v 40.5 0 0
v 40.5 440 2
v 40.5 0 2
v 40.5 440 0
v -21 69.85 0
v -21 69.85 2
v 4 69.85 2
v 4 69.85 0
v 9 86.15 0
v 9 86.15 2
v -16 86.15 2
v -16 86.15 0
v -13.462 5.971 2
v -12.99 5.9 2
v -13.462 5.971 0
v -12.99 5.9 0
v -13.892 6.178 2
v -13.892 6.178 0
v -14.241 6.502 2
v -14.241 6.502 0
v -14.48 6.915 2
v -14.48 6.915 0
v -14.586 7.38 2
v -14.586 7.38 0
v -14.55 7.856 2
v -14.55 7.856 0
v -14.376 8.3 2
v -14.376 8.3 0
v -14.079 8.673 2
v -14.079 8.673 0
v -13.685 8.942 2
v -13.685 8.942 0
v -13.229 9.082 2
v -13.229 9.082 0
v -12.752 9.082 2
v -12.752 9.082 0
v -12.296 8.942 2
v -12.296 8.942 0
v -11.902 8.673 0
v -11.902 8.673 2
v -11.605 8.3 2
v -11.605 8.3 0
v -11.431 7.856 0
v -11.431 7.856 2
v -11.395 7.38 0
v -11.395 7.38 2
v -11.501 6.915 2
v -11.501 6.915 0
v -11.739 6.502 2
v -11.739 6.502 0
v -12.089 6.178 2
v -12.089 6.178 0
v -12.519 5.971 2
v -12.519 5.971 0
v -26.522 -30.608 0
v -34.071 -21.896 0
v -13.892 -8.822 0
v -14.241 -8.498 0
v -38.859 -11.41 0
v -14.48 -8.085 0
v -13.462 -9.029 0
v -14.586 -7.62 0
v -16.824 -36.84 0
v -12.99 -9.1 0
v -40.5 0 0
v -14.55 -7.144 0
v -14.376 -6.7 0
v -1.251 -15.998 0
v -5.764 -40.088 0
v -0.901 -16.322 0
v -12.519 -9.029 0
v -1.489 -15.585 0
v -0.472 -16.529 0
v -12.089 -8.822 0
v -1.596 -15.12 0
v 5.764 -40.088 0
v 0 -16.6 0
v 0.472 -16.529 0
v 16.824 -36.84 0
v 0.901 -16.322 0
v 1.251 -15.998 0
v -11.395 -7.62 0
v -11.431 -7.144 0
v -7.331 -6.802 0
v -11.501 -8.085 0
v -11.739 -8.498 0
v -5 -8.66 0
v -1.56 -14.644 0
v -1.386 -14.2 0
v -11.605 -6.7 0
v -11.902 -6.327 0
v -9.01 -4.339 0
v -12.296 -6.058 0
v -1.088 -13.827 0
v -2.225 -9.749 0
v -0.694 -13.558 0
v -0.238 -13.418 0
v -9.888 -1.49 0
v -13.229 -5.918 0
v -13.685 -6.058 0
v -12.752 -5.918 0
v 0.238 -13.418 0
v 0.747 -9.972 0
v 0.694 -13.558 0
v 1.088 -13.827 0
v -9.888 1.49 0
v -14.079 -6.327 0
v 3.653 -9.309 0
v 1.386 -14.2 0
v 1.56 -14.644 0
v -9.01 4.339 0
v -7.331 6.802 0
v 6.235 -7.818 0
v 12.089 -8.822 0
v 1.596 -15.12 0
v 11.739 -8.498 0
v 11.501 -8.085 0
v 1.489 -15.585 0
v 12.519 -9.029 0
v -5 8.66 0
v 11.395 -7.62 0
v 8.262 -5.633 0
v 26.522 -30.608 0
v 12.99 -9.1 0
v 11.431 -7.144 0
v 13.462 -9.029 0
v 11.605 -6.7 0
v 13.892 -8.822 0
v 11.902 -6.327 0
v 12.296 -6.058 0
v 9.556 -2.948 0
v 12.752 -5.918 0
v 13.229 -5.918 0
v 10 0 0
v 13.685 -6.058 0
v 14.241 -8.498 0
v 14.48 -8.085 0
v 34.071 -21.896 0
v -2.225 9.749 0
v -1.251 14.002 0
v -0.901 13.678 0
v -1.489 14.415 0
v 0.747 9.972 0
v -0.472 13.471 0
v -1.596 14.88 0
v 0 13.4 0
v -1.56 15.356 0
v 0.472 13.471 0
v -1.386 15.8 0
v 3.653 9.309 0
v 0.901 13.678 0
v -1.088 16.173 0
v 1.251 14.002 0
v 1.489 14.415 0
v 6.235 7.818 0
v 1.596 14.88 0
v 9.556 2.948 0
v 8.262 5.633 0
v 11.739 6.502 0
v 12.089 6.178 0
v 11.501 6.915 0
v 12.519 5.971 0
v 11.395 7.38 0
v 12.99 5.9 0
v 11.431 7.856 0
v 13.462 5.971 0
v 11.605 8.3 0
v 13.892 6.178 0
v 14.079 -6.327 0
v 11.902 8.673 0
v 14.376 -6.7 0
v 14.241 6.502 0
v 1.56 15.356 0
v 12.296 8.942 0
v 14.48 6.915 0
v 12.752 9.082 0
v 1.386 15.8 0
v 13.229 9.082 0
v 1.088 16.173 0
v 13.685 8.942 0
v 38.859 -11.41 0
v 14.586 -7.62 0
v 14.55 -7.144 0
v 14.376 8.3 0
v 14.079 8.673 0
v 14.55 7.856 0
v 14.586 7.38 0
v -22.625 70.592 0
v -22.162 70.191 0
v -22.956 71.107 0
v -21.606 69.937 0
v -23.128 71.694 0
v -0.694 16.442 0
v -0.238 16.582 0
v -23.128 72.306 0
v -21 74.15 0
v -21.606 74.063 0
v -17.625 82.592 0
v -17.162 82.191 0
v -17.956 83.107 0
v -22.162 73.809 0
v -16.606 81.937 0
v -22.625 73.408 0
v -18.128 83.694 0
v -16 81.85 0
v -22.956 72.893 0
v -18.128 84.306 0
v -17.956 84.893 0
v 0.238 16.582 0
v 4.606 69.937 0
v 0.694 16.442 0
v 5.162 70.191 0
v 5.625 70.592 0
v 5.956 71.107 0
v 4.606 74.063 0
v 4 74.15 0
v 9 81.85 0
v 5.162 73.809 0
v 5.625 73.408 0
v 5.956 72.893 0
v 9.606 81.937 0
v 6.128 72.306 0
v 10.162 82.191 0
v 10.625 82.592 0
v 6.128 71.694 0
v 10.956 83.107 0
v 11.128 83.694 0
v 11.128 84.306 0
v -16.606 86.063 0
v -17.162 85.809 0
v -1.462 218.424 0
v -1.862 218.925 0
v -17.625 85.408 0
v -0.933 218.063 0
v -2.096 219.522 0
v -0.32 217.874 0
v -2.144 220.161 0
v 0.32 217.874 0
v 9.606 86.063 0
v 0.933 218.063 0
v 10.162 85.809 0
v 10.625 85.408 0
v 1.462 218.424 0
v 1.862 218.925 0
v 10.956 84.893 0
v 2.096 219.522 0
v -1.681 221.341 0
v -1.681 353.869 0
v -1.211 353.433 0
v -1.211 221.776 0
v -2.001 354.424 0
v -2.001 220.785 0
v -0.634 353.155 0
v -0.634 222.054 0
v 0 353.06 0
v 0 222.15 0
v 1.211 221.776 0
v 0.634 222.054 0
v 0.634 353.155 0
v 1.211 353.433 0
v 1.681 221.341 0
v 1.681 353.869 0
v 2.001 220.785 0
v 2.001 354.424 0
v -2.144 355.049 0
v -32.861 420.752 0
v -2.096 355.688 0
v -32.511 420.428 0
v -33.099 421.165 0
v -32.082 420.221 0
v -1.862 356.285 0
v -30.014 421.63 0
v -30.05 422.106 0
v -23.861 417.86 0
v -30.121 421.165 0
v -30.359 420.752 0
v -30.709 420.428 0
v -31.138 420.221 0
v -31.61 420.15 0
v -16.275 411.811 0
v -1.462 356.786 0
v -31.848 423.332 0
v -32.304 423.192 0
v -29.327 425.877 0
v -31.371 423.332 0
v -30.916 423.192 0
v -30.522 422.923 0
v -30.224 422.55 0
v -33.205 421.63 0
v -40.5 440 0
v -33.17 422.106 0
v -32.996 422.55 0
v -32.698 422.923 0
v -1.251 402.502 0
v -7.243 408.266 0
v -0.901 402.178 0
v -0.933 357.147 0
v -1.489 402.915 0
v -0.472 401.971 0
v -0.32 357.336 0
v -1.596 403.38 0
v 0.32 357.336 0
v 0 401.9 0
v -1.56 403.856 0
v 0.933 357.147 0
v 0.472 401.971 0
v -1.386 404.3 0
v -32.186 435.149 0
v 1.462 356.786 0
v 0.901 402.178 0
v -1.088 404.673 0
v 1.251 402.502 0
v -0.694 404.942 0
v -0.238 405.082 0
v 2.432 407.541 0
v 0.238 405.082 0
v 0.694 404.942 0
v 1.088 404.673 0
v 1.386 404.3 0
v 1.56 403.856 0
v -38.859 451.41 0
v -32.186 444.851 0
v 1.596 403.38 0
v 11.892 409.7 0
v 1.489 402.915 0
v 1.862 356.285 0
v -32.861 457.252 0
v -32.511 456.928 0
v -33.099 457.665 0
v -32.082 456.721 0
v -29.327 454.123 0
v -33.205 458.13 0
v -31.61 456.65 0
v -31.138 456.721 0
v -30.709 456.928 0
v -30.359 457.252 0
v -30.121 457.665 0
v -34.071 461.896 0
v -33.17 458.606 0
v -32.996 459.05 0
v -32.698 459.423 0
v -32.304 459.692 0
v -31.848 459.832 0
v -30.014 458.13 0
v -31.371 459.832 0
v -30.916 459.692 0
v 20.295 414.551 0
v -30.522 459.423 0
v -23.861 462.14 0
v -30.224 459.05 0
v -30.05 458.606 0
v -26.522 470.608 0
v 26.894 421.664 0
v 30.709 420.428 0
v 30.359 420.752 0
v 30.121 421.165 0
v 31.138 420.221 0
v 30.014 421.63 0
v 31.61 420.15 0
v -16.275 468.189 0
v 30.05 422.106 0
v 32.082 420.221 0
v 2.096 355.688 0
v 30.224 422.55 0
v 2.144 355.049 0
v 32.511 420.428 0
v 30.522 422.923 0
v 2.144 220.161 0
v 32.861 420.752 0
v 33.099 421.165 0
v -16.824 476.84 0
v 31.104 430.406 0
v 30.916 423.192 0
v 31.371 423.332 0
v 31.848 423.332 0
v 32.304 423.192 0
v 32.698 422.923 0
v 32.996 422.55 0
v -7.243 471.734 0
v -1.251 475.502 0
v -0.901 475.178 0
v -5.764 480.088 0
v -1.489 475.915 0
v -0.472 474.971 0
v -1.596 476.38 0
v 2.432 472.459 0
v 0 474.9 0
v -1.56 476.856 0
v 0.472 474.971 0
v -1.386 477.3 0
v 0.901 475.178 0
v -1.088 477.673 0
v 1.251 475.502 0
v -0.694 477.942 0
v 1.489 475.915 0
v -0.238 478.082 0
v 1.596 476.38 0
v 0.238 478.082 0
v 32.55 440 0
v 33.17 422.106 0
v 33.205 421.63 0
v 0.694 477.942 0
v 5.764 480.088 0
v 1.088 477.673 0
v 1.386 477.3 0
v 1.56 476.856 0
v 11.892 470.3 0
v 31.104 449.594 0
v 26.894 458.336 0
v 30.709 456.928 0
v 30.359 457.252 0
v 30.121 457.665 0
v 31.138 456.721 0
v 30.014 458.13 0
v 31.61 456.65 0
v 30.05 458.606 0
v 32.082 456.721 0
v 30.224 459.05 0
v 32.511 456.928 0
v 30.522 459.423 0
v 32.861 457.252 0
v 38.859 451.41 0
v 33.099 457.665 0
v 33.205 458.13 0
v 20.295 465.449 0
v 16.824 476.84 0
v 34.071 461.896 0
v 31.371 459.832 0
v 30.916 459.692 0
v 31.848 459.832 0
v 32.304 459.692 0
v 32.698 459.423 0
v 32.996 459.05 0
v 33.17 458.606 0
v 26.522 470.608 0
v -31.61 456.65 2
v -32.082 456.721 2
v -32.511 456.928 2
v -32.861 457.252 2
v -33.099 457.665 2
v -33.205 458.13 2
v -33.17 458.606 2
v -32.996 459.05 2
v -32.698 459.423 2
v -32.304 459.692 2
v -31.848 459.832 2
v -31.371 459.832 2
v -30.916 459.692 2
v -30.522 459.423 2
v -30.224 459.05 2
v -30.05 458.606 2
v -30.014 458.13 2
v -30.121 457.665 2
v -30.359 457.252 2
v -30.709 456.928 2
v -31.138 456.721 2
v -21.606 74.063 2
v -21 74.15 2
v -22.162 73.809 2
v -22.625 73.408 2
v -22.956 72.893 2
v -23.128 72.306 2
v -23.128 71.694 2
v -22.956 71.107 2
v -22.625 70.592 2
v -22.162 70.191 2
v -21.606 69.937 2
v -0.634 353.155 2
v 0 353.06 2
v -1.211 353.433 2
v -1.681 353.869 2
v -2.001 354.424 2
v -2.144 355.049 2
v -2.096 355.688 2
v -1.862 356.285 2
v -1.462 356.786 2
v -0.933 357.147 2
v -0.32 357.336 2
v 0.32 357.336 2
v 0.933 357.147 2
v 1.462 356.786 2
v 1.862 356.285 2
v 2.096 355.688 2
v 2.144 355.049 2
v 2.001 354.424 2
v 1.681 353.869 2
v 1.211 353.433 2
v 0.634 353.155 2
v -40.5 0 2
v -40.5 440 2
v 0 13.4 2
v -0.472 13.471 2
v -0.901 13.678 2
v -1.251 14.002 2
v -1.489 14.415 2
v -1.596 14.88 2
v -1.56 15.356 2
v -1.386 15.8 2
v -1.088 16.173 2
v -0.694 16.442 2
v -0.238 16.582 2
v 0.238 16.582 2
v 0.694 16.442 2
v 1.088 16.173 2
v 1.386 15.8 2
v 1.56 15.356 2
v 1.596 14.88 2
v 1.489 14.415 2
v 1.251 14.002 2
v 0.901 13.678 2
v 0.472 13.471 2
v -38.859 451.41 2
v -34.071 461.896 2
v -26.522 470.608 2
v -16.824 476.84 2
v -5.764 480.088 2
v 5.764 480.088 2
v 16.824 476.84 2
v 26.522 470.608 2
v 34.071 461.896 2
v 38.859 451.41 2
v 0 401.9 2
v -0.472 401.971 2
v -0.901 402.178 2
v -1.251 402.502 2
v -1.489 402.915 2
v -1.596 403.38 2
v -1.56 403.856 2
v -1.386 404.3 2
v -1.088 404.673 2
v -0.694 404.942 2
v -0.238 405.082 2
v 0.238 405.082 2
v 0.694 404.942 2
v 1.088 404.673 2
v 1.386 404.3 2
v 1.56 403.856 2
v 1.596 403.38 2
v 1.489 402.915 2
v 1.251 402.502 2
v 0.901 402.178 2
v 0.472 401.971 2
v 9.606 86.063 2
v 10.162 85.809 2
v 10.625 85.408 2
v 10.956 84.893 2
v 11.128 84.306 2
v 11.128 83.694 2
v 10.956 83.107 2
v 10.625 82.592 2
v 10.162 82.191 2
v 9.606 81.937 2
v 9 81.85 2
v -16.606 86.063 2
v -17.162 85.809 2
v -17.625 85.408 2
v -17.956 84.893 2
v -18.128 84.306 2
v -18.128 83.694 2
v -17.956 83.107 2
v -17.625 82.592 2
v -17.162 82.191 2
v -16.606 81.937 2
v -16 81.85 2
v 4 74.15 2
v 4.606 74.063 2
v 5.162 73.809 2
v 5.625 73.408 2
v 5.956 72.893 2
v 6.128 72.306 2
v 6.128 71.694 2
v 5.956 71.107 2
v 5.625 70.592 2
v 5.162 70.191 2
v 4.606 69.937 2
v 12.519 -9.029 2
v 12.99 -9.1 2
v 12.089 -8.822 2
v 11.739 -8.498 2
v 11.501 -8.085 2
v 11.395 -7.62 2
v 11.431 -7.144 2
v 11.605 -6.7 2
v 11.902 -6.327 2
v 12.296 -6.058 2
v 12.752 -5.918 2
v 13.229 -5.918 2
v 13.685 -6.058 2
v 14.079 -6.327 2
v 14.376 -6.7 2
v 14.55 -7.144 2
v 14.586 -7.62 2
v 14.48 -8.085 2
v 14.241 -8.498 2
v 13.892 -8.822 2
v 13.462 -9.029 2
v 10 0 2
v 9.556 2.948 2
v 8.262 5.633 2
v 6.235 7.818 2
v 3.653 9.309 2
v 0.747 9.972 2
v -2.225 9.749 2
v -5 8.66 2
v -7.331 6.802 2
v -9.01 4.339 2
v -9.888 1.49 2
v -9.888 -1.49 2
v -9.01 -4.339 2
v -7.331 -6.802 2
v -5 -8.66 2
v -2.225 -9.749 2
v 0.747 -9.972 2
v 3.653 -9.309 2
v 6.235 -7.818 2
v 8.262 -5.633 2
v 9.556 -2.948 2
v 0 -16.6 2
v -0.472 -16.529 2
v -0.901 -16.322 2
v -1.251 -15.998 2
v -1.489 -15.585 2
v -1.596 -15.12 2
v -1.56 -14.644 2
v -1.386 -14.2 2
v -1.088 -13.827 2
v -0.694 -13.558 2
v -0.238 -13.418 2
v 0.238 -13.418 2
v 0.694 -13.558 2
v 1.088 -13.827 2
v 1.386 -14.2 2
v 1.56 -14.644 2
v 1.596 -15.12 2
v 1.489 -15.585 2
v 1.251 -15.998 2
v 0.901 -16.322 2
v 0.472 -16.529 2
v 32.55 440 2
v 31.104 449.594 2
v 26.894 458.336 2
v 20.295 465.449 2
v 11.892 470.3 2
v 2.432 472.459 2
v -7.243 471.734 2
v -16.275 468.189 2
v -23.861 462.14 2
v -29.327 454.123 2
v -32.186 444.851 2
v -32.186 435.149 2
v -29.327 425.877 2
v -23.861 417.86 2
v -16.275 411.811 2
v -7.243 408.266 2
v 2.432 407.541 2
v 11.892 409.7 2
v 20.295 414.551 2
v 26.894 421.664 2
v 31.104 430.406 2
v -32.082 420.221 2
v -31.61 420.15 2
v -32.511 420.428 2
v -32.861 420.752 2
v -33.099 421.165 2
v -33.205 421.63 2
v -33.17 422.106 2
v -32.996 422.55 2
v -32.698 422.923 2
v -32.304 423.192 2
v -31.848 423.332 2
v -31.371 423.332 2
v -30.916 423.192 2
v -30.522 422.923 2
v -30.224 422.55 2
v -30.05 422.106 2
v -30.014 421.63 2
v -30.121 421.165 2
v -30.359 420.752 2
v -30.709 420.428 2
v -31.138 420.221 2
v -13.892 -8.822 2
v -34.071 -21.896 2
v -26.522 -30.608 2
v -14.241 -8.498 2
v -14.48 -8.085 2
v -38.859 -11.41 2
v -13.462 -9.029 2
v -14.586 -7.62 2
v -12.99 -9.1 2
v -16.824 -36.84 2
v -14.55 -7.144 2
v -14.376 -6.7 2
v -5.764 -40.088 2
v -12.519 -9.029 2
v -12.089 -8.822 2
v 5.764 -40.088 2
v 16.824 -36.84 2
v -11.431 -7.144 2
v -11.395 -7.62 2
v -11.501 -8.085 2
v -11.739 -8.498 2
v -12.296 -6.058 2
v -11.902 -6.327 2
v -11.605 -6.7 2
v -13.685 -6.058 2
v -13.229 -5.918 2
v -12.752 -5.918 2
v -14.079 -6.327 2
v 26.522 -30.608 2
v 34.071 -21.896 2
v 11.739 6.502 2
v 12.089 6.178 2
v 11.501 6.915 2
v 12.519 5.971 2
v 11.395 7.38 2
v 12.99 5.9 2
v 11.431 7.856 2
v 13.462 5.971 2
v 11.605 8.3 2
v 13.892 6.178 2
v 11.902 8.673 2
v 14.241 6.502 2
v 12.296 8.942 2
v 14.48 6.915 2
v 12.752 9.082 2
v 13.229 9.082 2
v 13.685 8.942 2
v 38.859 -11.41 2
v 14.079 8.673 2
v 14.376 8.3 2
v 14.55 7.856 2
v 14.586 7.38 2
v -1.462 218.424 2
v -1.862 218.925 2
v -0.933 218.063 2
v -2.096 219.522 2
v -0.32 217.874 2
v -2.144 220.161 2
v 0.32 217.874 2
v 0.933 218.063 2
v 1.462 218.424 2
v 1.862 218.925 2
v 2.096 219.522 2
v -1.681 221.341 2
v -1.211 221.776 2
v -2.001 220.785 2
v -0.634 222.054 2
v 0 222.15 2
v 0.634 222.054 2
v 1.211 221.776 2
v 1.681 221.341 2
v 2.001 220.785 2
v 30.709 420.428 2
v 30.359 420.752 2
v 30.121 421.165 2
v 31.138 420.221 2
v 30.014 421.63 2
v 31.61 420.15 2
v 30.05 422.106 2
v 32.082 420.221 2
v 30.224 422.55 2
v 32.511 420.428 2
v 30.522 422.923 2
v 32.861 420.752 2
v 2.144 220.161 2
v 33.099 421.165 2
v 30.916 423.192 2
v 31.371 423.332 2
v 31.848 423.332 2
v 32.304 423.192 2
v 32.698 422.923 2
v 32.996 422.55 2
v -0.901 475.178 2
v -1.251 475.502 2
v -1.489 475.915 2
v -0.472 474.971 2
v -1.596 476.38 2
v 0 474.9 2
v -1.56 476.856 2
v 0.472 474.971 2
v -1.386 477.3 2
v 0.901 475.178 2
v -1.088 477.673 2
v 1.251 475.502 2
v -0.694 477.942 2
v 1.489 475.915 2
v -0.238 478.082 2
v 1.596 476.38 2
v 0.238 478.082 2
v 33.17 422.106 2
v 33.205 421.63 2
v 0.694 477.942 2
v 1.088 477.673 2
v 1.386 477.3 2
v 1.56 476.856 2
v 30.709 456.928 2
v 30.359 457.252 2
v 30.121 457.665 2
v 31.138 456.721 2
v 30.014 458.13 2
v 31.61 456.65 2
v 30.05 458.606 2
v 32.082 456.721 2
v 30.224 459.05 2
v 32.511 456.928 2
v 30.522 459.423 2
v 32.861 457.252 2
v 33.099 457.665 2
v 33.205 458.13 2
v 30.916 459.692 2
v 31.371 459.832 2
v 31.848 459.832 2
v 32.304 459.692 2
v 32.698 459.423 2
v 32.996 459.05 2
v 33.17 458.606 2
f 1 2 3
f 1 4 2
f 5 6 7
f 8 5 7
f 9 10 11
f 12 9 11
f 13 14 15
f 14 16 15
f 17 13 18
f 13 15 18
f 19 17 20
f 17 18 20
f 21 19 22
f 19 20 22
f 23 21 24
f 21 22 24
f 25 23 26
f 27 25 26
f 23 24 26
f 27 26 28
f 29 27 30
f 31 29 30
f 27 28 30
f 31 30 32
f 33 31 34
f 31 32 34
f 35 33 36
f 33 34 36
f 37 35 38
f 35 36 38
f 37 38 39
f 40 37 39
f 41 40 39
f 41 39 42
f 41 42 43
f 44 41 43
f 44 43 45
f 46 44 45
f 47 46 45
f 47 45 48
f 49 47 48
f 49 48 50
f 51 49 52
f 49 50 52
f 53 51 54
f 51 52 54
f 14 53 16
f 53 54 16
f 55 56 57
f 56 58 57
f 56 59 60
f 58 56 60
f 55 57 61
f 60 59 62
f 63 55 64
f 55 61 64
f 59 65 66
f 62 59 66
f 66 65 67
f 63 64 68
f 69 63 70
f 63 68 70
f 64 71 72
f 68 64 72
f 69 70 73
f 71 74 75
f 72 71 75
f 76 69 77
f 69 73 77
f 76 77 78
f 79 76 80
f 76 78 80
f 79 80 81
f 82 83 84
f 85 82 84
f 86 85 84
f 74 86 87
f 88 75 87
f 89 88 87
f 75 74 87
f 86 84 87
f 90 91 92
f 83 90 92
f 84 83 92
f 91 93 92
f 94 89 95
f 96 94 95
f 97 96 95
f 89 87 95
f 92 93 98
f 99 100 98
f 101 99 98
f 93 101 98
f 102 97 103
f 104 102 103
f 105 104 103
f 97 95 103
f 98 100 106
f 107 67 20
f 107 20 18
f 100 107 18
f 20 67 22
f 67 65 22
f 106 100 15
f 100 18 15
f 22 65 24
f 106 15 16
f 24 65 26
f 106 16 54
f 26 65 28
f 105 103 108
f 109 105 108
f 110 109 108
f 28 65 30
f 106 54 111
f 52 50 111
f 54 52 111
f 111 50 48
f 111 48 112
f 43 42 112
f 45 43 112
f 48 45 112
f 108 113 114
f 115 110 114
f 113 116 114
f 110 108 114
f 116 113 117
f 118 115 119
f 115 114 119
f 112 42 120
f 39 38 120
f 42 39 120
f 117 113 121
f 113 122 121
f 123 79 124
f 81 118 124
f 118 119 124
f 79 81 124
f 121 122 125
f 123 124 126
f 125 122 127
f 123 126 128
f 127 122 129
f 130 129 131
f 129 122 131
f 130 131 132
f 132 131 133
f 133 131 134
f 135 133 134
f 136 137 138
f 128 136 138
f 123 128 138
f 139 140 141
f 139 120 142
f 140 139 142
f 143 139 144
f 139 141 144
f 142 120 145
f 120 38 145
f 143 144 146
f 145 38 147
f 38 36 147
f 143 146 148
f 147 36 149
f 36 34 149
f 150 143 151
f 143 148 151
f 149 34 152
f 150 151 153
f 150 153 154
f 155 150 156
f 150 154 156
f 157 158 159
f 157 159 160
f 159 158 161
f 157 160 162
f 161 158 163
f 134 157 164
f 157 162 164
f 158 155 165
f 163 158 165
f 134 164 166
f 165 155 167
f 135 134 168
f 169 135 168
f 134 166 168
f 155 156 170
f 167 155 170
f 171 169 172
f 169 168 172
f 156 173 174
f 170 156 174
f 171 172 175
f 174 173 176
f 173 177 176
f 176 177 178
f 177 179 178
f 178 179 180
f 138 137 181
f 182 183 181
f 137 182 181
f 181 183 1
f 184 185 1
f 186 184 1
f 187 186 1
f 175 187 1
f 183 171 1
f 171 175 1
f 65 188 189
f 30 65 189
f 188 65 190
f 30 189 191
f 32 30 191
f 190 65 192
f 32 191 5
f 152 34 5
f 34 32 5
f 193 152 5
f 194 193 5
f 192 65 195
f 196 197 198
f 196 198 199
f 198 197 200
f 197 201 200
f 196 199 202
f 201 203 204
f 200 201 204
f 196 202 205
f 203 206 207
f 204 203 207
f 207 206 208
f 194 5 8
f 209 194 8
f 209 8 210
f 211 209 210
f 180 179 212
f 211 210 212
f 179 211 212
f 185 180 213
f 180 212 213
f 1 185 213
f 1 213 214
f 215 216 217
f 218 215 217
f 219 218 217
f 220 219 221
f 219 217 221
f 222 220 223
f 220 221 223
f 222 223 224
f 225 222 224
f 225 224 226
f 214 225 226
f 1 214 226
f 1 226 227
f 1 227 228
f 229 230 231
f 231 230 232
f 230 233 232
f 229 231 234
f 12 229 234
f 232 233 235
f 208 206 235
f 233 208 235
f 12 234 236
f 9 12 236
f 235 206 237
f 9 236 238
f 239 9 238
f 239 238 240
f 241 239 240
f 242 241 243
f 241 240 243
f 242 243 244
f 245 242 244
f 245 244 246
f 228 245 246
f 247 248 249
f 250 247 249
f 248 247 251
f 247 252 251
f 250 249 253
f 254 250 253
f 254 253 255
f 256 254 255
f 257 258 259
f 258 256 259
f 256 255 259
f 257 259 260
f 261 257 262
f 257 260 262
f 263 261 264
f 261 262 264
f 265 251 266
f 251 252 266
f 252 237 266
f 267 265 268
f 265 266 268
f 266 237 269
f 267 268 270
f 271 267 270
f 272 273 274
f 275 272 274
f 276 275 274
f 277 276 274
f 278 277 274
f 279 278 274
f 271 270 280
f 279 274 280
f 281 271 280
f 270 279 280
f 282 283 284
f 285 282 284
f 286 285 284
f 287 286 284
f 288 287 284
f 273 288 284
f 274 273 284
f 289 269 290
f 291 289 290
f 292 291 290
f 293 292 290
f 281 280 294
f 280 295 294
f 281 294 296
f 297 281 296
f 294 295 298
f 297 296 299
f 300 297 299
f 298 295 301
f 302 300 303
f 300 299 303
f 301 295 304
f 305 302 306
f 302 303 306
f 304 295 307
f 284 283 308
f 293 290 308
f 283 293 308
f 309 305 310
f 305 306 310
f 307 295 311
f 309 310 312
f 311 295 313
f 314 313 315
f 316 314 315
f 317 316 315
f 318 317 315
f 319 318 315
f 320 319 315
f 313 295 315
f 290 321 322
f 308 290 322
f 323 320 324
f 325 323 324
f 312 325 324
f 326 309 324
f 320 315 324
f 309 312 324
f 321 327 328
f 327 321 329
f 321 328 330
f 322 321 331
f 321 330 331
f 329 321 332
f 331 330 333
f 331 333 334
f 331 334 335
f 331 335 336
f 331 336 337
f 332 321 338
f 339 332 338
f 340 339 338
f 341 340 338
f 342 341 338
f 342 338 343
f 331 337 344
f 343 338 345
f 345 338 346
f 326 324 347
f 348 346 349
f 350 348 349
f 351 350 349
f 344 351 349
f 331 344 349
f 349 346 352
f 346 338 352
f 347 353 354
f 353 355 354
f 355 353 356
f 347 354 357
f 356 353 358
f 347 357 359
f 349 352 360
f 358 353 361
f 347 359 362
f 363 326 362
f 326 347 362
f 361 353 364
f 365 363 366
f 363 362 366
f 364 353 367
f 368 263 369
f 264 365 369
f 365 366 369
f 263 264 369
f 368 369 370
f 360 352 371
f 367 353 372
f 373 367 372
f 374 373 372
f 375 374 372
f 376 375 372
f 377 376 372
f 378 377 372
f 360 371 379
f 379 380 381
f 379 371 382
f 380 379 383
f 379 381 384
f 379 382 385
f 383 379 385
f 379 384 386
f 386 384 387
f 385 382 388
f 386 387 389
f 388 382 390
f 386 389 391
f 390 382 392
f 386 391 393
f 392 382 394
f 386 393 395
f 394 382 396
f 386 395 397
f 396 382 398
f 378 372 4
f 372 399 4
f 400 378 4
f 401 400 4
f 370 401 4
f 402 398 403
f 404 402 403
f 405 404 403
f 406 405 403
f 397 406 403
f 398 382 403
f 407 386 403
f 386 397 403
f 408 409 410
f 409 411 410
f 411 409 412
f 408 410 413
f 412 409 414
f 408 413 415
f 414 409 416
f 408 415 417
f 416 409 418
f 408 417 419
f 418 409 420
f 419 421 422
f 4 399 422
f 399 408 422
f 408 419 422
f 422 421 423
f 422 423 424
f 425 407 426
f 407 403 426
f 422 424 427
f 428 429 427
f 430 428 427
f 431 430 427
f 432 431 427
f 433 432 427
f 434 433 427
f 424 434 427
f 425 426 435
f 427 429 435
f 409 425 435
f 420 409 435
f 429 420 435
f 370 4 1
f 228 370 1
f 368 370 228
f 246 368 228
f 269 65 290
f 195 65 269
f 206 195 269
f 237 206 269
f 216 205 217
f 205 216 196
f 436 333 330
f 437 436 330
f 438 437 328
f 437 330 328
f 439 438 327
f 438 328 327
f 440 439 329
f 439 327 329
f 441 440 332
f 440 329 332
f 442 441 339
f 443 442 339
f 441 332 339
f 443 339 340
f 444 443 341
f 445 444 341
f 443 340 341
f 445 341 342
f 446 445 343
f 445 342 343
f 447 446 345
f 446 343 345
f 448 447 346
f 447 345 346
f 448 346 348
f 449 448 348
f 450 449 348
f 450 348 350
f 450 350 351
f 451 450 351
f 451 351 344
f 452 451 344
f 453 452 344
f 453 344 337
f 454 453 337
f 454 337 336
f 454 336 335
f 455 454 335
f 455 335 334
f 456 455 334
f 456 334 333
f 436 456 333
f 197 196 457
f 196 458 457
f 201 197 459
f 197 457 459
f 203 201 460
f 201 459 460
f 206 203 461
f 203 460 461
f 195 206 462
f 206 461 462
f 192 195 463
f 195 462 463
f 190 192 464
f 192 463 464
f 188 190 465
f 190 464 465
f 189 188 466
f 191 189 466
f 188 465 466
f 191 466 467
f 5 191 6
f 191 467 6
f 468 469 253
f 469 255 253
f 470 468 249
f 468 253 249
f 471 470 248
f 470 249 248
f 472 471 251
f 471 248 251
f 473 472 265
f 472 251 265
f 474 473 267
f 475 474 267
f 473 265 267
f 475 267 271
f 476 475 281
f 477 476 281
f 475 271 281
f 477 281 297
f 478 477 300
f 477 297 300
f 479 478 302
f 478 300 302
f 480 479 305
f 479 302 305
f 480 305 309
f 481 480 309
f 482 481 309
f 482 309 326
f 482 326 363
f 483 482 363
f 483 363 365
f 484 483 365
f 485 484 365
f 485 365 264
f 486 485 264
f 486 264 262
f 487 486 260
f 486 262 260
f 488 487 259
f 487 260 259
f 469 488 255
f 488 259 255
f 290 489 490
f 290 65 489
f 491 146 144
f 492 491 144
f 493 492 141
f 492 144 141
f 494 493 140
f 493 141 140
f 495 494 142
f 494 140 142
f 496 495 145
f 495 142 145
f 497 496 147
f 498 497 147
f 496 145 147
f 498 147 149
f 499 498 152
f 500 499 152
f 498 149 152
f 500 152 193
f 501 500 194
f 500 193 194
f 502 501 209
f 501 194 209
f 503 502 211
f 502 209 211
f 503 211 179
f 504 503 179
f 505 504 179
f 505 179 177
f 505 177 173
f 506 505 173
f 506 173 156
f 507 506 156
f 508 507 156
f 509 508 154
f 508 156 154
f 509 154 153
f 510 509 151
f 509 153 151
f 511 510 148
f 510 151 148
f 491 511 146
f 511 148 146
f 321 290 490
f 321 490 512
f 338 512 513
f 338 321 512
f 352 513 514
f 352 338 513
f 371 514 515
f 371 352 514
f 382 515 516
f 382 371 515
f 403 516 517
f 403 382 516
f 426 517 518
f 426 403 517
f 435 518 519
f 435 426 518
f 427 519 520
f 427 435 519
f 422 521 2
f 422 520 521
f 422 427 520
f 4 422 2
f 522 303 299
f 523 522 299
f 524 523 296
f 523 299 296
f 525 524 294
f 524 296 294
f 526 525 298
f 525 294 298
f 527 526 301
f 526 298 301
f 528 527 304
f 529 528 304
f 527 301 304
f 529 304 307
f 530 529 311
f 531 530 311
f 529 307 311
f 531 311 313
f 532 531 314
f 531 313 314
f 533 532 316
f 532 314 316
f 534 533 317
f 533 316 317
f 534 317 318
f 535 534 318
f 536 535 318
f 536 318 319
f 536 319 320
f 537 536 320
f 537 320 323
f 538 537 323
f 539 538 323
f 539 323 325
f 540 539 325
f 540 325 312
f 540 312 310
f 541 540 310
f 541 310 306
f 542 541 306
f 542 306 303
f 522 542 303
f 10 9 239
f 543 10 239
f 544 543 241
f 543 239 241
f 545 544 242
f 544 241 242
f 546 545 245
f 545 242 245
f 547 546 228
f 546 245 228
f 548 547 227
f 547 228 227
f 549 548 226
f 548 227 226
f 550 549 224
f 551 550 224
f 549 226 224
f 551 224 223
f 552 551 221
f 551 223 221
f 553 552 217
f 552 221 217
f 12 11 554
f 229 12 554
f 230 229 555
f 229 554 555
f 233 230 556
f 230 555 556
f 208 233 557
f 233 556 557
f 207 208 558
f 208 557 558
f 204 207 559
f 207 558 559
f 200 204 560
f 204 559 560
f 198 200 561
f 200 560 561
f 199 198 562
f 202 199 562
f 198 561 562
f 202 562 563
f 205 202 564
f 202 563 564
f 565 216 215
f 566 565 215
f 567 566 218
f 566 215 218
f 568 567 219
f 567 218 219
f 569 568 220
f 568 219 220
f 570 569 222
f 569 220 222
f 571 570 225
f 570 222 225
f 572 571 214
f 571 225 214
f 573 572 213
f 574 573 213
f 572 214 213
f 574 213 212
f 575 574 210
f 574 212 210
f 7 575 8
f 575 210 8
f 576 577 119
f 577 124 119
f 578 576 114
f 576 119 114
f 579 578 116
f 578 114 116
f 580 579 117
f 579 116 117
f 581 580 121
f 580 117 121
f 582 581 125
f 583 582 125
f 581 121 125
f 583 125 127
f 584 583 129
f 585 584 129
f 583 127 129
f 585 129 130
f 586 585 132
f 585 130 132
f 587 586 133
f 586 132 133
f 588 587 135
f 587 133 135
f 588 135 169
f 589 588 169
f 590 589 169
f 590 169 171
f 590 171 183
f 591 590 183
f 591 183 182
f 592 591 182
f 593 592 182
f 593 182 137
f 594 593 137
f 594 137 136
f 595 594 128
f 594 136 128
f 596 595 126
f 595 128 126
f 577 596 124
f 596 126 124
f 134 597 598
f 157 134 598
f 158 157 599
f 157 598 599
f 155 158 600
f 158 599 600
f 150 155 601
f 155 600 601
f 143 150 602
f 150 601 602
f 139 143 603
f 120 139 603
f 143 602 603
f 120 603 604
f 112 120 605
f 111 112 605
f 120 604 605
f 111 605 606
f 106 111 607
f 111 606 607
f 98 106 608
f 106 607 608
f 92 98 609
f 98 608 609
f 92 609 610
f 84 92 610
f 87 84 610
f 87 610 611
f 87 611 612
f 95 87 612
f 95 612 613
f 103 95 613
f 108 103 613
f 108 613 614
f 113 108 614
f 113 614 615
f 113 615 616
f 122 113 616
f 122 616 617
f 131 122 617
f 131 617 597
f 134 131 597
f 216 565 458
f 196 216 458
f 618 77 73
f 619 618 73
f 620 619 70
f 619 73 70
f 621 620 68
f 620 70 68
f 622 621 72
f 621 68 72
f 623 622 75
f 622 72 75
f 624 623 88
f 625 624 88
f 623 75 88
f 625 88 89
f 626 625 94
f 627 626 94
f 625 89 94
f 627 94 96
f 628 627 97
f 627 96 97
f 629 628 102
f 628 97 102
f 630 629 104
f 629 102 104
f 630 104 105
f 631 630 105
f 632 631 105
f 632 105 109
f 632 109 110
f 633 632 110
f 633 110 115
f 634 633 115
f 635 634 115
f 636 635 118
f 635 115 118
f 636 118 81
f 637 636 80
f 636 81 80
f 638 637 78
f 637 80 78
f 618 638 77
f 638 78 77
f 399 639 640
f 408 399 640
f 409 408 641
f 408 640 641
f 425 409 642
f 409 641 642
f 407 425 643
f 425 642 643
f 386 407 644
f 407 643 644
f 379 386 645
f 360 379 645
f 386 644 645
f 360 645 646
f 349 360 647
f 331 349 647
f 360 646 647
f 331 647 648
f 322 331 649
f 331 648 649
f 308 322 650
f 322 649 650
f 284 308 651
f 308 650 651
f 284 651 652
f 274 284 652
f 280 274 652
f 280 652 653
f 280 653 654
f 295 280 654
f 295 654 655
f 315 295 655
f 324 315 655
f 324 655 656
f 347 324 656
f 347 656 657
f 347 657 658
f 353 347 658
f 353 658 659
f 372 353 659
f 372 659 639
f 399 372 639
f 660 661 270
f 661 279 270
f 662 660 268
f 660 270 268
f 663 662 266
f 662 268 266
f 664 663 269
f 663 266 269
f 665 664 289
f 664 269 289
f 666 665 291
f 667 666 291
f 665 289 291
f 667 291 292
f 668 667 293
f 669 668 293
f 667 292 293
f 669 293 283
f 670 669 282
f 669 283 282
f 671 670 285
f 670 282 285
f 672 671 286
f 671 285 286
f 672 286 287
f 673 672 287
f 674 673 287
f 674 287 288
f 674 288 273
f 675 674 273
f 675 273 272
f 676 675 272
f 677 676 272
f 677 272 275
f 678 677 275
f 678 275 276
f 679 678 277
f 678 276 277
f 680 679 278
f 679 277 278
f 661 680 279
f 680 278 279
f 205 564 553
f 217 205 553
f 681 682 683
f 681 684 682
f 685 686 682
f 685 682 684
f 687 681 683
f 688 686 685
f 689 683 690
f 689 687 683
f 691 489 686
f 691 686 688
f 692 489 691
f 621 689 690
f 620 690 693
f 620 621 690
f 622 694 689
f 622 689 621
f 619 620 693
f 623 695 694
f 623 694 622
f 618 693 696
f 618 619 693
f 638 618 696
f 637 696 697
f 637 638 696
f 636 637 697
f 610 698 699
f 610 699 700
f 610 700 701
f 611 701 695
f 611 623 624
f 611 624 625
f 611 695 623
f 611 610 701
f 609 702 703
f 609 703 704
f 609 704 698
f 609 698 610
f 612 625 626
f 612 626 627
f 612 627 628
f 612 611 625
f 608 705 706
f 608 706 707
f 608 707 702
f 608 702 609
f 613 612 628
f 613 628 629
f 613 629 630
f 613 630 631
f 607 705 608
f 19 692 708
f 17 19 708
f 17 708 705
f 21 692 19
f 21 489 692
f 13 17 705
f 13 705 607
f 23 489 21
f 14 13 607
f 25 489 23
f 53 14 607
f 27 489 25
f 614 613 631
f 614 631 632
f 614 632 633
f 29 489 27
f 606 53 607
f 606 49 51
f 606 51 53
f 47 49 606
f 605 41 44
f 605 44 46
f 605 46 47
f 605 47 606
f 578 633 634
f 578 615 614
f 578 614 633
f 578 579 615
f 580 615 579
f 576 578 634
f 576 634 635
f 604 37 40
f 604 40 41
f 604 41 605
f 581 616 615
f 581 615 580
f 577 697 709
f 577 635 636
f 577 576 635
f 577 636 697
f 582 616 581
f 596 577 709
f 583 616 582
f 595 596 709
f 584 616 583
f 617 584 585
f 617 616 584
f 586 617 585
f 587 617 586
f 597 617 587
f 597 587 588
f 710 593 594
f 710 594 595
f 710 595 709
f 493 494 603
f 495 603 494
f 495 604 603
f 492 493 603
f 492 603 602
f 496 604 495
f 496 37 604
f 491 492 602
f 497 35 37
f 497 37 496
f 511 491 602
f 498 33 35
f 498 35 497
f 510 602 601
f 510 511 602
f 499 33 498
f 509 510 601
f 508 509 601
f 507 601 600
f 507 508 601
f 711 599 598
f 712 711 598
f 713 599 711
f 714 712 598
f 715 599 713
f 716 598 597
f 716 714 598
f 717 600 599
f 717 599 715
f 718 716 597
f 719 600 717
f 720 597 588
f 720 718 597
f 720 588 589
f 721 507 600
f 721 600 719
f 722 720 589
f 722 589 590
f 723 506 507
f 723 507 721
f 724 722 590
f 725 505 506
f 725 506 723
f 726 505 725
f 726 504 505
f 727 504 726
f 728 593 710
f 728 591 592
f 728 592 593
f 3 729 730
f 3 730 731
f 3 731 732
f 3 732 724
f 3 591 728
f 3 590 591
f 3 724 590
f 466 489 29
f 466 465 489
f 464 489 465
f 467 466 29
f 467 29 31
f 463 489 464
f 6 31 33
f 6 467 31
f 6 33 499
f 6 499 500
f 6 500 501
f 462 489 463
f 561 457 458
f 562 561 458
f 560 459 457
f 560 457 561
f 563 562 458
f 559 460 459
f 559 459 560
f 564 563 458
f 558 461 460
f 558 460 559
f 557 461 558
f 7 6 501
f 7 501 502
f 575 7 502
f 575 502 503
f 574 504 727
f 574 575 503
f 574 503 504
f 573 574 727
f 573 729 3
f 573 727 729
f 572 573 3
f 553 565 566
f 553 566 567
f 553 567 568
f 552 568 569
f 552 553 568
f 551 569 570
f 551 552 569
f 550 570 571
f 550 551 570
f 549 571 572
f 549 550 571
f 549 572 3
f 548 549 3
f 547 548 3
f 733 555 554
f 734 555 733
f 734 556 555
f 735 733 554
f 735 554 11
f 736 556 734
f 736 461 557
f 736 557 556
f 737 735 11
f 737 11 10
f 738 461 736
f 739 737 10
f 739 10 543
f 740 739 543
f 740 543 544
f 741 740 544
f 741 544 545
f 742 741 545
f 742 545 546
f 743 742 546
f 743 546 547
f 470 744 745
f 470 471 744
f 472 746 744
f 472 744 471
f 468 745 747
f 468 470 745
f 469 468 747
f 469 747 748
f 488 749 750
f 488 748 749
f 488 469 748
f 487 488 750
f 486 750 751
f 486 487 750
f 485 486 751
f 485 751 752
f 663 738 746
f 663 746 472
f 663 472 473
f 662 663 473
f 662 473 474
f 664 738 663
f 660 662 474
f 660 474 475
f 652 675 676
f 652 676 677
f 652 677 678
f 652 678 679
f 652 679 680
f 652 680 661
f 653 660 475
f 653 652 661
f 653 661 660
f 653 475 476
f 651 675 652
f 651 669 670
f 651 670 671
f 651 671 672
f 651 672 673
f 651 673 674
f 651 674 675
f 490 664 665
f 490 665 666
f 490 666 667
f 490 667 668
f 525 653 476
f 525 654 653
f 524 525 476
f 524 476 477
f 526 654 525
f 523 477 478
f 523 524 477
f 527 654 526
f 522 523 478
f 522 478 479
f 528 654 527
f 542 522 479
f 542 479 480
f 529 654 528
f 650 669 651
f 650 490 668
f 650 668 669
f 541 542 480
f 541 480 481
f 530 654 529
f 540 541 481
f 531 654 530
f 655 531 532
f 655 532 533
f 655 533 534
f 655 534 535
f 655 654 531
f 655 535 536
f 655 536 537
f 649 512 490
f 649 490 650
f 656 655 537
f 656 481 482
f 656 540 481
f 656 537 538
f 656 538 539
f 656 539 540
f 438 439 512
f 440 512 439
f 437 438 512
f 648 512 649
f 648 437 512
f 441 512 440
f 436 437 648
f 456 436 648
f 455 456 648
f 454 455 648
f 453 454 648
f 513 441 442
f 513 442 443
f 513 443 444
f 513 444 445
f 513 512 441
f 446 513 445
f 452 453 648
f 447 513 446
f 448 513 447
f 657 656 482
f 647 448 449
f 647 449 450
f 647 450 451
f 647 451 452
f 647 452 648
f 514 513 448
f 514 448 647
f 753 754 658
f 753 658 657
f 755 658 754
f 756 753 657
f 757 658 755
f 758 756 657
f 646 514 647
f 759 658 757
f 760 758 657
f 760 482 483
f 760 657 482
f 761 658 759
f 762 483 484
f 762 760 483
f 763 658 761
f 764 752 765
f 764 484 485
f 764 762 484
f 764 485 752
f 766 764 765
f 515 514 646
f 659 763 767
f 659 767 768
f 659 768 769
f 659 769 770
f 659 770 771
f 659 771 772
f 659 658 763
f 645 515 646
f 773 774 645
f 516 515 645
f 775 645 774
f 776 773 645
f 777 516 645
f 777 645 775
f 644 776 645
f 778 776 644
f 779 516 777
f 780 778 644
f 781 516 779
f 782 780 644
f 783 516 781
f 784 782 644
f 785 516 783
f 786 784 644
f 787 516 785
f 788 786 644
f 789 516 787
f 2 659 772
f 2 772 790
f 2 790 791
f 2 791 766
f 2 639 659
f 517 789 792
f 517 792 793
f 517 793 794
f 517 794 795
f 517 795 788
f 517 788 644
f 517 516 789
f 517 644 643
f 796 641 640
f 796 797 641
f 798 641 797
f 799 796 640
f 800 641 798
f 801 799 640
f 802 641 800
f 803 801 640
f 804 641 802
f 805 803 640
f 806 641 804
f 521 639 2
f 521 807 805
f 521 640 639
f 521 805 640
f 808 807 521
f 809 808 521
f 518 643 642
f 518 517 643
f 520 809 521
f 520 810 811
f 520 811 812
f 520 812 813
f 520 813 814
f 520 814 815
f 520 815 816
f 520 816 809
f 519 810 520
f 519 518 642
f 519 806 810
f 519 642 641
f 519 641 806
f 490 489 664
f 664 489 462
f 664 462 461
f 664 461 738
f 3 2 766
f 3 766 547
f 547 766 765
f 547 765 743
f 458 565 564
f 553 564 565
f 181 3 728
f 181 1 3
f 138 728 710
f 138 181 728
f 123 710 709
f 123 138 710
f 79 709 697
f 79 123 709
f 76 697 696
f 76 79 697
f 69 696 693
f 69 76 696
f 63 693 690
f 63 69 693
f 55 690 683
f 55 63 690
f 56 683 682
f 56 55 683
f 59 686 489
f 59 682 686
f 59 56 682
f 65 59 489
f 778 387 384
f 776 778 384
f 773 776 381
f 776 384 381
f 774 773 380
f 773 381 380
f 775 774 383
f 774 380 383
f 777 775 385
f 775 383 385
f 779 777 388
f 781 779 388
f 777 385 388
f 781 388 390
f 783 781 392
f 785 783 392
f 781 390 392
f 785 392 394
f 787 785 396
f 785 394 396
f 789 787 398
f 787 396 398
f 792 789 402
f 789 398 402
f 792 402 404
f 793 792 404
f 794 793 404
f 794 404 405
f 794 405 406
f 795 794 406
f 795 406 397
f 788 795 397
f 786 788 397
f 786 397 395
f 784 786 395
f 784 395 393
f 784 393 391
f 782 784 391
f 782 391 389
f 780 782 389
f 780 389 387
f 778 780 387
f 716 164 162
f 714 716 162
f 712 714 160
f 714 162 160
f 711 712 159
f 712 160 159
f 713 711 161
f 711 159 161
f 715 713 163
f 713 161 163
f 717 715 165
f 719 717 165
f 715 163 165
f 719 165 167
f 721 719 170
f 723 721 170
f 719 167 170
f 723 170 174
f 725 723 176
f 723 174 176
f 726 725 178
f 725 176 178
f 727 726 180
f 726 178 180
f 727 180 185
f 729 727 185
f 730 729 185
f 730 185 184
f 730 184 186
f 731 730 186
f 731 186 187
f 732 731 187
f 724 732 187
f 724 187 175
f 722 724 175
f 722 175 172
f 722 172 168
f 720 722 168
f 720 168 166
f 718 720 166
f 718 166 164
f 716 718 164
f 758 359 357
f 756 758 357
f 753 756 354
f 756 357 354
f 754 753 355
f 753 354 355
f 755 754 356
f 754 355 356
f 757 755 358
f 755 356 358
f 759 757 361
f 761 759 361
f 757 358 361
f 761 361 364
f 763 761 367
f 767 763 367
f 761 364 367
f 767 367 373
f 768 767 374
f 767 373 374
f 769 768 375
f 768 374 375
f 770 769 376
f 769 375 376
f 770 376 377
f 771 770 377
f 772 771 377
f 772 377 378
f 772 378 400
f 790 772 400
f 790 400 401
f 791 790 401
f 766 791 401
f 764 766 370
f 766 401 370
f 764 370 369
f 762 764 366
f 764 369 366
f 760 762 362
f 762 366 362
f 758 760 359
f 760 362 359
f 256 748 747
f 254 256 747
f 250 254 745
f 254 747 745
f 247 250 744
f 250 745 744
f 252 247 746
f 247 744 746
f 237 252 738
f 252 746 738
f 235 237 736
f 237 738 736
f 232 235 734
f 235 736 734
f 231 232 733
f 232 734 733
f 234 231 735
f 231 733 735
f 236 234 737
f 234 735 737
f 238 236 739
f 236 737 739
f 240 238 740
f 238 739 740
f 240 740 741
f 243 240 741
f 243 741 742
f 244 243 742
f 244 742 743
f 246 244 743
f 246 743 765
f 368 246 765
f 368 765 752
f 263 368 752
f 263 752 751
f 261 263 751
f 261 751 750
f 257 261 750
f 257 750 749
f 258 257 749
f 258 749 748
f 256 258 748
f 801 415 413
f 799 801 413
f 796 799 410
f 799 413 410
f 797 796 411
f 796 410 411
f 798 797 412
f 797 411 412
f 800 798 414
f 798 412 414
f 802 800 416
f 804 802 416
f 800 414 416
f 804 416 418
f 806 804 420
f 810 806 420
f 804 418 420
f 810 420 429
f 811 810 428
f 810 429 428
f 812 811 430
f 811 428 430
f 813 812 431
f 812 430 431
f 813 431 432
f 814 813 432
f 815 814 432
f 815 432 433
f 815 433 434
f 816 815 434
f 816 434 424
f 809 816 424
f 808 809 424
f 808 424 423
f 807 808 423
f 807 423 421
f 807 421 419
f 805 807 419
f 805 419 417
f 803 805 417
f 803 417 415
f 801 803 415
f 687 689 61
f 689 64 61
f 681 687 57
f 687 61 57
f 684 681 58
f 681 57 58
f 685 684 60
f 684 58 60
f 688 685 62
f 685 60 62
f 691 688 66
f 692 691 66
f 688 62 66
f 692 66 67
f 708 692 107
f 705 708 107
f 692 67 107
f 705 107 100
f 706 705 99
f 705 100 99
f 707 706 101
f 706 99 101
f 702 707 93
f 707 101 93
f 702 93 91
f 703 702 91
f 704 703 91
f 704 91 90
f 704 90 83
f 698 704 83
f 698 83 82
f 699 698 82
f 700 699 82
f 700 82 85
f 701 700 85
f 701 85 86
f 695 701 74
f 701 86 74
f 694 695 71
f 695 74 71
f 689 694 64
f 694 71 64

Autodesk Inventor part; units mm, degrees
ref_plane "YZ Plane" through (0, 0, 0) normal (1, 0, 0) x (0, 1, 0)
ref_plane "XZ Plane" through (0, 0, 0) normal (0, 1, 0) x (-1, 0, 0)
ref_plane "XY Plane" through (0, 0, 0) normal (0, 0, 1) x (1, 0, 0)
sketch "スケッチ1" plane through (0, 0, 0) normal (0, 0, 1) x (1, 0, 0)
  circle A0 centre (0, 0) radius 40.5
  circle A1 centre (0, 440) radius 40.5
  line L0 (-40.5, 0) -> (-40.5, 440)
  line L1 (40.5, 440) -> (40.5, 0)
  dimension "d0" = 81
  dimension "d1" = 81
  dimension "d2" = 440
extrude "プレート1" add sketch "スケッチ1" along normal blind 2
sketch "スケッチ6" plane through (0, 0, 2) normal (0, 0, 1) x (1, 0, 0)
  arc A0 (40.5, 440) -> (-40.5, 440) centre (0, 440) ccw projected
  circle A1 centre (0, 440) radius 32.55
  point P0 (0, 0)
  dimension "d43" = 65.1
extrude "押し出し2" cut sketch "スケッチ6" against normal blind 10
sketch "スケッチ7" plane through (0, 0, 2) normal (0, 0, 1) x (1, 0, 0)
  arc A0 (40.5, 440) -> (-40.5, 440) centre (0, 440) ccw projected
  circle A1 centre (0, 440) radius 36.5
  point P0 (0, 0)
  point P1 (0, 476.5)
  point P2 (-31.6099, 458.25)
  point P3 (-31.6099, 421.75)
  point P4 (0, 403.5)
  point P5 (31.6099, 421.75)
  point P6 (31.6099, 458.25)
  dimension "d46" = 73
  dimension "d49" = 360
hole "穴4" at (0, 476.5, 2) at (-31.6099, 458.25, 2) at (-31.6099, 421.75, 2) at (0, 403.5, 2) at (31.6099, 421.75, 2) at (31.6099, 458.25, 2) direction (0, 0, -1) diameter 3.2 end through all clearance for "Socket Head Cap Screw" size "M3" standard "Ansi Metric M Profile"
sketch "スケッチ8" plane through (0, 0, 2) normal (0, 0, 1) x (1, 0, 0)
  arc A0 (40.5, 440) -> (-40.5, 440) centre (0, 440) ccw projected
  circle A1 centre (0, 440) radius 25
  line L0 (23.4923, 431.4495) -> (-32.7335, 276.9703)
  line L1 (-23.4923, 448.5505) -> (-36.9957, 411.4503)
  line L2 (0, 603.9) -> (0, -147.9) projected
  circle A2 centre (0, 355.2097) radius 4
  point P0 (0, 0)
  point P1 (4, 72)
  dimension "d92" = 50
  dimension "d93" = 20
  dimension "d94" = 8
  dimension "d102" = 0
  dimension "d140" = 72
  dimension "d141" = 4
hole "穴5" at (4, 72, 2) at (0, 355.2097, 2) direction (0, 0, -1) diameter 4.3 end through all clearance for "Socket Head Cap Screw" size "M4" standard "Ansi Metric M Profile"
sketch "スケッチ9" plane through (0, 0, 2) normal (0, 0, 1) x (1, 0, 0)
  circle A0 centre (0, 0) radius 67.5
  circle A1 centre (9, 84) radius 8
  arc A2 (40.5, 440) -> (-40.5, 440) centre (0, 440) ccw projected
  dimension "d69" = 84
  dimension "d79" = 135
  dimension "d80" = 16
  dimension "d144" = 9
hole "穴6" at (9, 84, 2) direction (0, 0, -1) diameter 4.3 end through all clearance for "Flat Head Machine Screw" size "M4" standard "Ansi Metric M Profile"
sketch "スケッチ13" plane through (0, 0, 2) normal (0, 0, 1) x (1, 0, 0)
  circle A0 centre (0, 0) radius 15
  point P0 (0, 15)
  point P1 (-12.9904, 7.5)
  point P2 (-12.9904, -7.5)
  point P3 (0, -15)
  point P4 (12.9904, -7.5)
  point P5 (12.9904, 7.5)
  dimension "d109" = 30
  dimension "d112" = 360
hole "穴8" at (0, 15, 2) at (-12.9904, 7.5, 2) at (-12.9904, -7.5, 2) at (0, -15, 2) at (12.9904, -7.5, 2) at (12.9904, 7.5, 2) direction (0, 0, -1) diameter 3.2 end through all clearance for "Flat Head Machine Screw" size "M3" standard "Ansi Metric M Profile"
sketch "スケッチ14" plane through (0, 0, 2) normal (0, 0, 1) x (1, 0, 0)
  circle A0 centre (0, 0) radius 10
  dimension "d121" = 20
extrude "押し出し5" cut sketch "スケッチ14" against normal blind 10
sketch "スケッチ15" plane through (0, 0, 2) normal (0, 0, 1) x (1, 0, 0)
  line L0 (-16, 84) -> (9, 84) construction
  line L1 (-16, 81.85) -> (9, 81.85)
  line L2 (9, 86.15) -> (-16, 86.15)
  arc A0 (-16, 86.15) -> (-16, 81.85) centre (-16, 84) ccw
  arc A1 (9, 81.85) -> (9, 86.15) centre (9, 84) ccw
  circle A2 centre (9, 84) radius 2.15 projected
  point P0 (0, 0)
  dimension "d142" = 25
extrude "押し出し6" cut sketch "スケッチ15" against normal blind 10
sketch "スケッチ17" plane through (0, 0, 0) normal (0, 0, -1) x (-1, 0, 0)
  point P0 (0, 0)
  point P1 (0, 220)
  dimension "d132" = 220
hole "穴9" at (0, 220, 0) direction (0, 0, 1) diameter 4.3 end through all clearance for "Flat Head Machine Screw" size "M4" standard "Ansi Metric M Profile"
sketch "スケッチ16" plane through (0, 0, 2) normal (0, 0, 1) x (1, 0, 0)
  line L0 (-21, 72) -> (4, 72) construction
  line L1 (-21, 69.85) -> (4, 69.85)
  line L2 (4, 74.15) -> (-21, 74.15)
  arc A0 (-21, 74.15) -> (-21, 69.85) centre (-21, 72) ccw
  arc A1 (4, 69.85) -> (4, 74.15) centre (4, 72) ccw
  circle A2 centre (4, 72) radius 2.15 projected
  point P0 (0, 0)
  point P1 (-8.5, 72)
  dimension "d143" = 21
extrude "押し出し7" cut sketch "スケッチ16" against normal blind 10
equation "\"d56\" = Thickness"
equation "\"d67\" = Thickness"
equation "\"d77\" = Thickness"
equation "\"d119\" = Thickness"
equation "\"d138\" = Thickness"
equation "\"d3\" = Thickness"
equation "\"BendRadius\" = Thickness"
equation "\"BendReliefWidth\" = Thickness"
equation "\"BendReliefDepth\" = 0.5 * Thickness"
equation "\"CornerReliefSize\" = 4 * Thickness"
equation "\"MinimumRemnant\" = 2 * Thickness"
equation "\"TransitionRadius\" = BendRadius"
equation "\"JacobiRadiusSize\" = Thickness"
equation "\"GapSize\" = Thickness"
equation "\"Thickness\" = 2"
properties part number "link2-plate1" material "CFRP"
